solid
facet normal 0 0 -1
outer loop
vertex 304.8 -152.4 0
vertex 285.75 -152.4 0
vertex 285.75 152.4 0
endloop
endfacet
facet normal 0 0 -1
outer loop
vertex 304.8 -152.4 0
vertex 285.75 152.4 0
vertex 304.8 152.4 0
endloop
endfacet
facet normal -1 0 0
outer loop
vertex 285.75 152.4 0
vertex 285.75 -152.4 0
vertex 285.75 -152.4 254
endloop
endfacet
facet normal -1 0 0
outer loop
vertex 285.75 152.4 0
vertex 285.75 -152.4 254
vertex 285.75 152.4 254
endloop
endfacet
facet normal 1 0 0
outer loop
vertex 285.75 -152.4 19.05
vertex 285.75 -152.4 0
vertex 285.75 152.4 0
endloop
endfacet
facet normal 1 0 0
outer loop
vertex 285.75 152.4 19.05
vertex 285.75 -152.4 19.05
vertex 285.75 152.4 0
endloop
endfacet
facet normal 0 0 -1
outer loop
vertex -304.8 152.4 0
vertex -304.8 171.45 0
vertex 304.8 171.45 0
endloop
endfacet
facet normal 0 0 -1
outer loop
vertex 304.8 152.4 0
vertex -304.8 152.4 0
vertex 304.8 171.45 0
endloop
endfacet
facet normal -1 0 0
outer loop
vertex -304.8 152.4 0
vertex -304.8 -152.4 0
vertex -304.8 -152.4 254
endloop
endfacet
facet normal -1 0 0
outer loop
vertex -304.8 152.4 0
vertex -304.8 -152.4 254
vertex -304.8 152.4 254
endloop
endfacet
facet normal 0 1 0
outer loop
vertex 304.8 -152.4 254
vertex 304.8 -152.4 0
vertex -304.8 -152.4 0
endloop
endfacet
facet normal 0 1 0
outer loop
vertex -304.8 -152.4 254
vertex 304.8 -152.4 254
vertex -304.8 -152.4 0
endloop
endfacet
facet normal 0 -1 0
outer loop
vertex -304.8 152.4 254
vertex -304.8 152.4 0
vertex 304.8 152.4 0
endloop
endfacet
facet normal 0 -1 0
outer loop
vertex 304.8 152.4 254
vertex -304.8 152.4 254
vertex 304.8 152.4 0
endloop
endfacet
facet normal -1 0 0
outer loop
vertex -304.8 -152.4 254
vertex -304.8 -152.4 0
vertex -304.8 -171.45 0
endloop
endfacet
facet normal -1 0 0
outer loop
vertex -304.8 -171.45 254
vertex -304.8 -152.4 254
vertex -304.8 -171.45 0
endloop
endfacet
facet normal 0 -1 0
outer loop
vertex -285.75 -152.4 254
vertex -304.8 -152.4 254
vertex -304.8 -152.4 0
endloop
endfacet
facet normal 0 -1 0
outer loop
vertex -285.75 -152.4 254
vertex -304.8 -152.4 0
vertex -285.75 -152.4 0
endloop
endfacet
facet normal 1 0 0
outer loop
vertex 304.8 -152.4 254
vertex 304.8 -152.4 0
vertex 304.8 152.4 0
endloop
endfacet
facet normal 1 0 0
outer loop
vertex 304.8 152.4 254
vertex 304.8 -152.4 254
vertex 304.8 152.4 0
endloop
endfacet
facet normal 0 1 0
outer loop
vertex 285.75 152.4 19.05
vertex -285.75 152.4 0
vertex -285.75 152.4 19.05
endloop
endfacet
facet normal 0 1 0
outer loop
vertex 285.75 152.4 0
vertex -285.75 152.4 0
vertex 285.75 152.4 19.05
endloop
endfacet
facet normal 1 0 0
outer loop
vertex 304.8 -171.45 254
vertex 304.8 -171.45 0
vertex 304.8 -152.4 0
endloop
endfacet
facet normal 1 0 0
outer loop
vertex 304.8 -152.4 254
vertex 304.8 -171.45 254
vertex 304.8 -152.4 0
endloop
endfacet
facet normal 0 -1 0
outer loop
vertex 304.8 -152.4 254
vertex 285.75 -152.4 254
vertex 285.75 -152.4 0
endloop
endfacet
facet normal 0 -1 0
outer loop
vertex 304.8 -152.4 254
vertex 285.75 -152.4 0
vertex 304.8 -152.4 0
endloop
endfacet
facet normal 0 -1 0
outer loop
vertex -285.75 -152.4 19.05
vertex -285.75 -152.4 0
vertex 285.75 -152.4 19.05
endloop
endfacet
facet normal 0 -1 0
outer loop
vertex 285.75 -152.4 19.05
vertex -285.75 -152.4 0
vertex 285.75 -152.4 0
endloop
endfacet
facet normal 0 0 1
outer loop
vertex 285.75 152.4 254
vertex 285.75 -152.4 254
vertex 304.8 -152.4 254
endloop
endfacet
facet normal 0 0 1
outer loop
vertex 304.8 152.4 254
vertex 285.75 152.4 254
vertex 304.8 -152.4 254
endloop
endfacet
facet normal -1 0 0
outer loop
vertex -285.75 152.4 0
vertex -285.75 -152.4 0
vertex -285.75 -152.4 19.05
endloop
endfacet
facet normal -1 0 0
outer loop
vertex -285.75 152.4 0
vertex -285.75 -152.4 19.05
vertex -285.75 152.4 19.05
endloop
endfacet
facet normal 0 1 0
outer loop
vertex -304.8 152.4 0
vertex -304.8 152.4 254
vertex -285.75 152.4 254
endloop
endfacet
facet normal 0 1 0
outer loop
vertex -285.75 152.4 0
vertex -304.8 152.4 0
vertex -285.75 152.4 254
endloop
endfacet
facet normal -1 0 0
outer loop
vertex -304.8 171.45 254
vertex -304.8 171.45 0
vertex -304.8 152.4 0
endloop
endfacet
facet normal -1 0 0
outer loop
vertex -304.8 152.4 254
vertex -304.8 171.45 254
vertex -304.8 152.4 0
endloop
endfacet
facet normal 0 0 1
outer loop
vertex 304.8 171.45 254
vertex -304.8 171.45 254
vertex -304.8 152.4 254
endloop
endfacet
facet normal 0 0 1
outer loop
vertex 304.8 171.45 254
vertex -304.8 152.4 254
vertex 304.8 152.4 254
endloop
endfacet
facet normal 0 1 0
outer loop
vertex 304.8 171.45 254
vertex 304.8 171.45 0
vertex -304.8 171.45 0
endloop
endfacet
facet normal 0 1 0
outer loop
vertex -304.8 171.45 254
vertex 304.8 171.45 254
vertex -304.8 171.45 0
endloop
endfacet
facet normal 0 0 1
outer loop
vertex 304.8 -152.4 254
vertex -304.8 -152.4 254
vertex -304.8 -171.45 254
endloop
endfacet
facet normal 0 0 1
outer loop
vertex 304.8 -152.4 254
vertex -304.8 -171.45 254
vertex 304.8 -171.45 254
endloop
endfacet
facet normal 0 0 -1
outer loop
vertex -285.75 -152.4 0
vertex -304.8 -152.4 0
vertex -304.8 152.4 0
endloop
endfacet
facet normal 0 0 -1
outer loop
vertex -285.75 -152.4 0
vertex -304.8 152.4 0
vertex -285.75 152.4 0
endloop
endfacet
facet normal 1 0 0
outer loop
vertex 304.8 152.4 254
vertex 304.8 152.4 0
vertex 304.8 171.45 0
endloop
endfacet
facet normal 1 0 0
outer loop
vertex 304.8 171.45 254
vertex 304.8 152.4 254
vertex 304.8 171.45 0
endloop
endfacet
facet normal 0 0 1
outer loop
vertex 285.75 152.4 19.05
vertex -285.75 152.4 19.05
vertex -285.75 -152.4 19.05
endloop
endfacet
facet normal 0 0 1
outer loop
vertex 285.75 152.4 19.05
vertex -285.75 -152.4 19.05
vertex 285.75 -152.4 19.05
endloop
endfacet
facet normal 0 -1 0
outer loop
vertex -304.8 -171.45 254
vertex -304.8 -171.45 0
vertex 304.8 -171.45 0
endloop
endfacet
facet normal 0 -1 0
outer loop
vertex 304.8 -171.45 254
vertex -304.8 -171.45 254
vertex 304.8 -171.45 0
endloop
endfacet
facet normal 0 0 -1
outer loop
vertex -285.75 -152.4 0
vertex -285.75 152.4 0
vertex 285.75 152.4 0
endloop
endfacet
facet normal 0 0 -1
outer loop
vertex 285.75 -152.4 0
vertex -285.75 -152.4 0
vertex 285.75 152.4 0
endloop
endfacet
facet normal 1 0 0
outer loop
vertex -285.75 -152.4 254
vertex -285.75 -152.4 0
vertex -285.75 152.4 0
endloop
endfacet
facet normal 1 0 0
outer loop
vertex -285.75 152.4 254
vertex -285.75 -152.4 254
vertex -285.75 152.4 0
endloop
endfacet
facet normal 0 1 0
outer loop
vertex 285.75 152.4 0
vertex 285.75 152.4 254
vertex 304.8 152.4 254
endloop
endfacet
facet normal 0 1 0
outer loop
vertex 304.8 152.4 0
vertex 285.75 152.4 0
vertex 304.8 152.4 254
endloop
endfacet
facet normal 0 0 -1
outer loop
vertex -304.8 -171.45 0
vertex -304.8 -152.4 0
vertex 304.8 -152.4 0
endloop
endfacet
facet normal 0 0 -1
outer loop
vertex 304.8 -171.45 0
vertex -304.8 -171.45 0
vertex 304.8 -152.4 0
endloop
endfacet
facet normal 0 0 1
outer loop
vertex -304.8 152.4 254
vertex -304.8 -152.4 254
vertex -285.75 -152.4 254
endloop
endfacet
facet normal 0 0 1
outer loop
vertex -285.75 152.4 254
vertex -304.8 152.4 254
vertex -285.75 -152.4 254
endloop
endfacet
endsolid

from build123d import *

# Parameters (mm, degrees)
F2_W     = 571.5
F2_H     = 304.8
F3_DEPTH = 19.05
F2_W_2   = 19.05
F4_DEPTH = 254
F5_DEPTH = 254


# Not quite as in the source:
# - a variable given as a bare number and used for a length is read in inches; the dataset says mm whatever the document's units were


with BuildPart() as f3:
    # F2 (on Top) → F3 (new body)
    with BuildSketch(Plane.XY):
        Rectangle(F2_W, F2_H)
    extrude(amount=F3_DEPTH)


with BuildPart() as f4:
    # F2 (on Top) → F4 (new body)
    with BuildSketch(Plane.XY):
        with Locations((-295.275, 0)):
            Rectangle(F2_W_2, F2_H)
    extrude(amount=F4_DEPTH)


with BuildPart() as f4b:
    # F2 (on Top) → F4, piece 2 (new body)
    with BuildSketch(Plane.XY):
        with Locations((295.275, 0)):
            Rectangle(F2_W_2, F2_H)
    extrude(amount=F4_DEPTH)


with BuildPart() as f5:
    # F2 (on Top) → F5 (new body)
    with BuildSketch(Plane.XY):
        Polygon((304.8, -152.4), (285.75, -152.4), (-285.75, -152.4), (-304.8, -152.4), (-304.8, -171.45), (304.8, -171.45), align=None)
    extrude(amount=F5_DEPTH)


with BuildPart() as f5b:
    # F2 (on Top) → F5, piece 2 (new body)
    with BuildSketch(Plane.XY):
        Polygon((-285.75, 152.4), (285.75, 152.4), (304.8, 152.4), (304.8, 171.45), (-304.8, 171.45), (-304.8, 152.4), align=None)
    extrude(amount=F5_DEPTH)


solid = Compound([f3.part, f4.part, f4b.part, f5.part, f5b.part])
